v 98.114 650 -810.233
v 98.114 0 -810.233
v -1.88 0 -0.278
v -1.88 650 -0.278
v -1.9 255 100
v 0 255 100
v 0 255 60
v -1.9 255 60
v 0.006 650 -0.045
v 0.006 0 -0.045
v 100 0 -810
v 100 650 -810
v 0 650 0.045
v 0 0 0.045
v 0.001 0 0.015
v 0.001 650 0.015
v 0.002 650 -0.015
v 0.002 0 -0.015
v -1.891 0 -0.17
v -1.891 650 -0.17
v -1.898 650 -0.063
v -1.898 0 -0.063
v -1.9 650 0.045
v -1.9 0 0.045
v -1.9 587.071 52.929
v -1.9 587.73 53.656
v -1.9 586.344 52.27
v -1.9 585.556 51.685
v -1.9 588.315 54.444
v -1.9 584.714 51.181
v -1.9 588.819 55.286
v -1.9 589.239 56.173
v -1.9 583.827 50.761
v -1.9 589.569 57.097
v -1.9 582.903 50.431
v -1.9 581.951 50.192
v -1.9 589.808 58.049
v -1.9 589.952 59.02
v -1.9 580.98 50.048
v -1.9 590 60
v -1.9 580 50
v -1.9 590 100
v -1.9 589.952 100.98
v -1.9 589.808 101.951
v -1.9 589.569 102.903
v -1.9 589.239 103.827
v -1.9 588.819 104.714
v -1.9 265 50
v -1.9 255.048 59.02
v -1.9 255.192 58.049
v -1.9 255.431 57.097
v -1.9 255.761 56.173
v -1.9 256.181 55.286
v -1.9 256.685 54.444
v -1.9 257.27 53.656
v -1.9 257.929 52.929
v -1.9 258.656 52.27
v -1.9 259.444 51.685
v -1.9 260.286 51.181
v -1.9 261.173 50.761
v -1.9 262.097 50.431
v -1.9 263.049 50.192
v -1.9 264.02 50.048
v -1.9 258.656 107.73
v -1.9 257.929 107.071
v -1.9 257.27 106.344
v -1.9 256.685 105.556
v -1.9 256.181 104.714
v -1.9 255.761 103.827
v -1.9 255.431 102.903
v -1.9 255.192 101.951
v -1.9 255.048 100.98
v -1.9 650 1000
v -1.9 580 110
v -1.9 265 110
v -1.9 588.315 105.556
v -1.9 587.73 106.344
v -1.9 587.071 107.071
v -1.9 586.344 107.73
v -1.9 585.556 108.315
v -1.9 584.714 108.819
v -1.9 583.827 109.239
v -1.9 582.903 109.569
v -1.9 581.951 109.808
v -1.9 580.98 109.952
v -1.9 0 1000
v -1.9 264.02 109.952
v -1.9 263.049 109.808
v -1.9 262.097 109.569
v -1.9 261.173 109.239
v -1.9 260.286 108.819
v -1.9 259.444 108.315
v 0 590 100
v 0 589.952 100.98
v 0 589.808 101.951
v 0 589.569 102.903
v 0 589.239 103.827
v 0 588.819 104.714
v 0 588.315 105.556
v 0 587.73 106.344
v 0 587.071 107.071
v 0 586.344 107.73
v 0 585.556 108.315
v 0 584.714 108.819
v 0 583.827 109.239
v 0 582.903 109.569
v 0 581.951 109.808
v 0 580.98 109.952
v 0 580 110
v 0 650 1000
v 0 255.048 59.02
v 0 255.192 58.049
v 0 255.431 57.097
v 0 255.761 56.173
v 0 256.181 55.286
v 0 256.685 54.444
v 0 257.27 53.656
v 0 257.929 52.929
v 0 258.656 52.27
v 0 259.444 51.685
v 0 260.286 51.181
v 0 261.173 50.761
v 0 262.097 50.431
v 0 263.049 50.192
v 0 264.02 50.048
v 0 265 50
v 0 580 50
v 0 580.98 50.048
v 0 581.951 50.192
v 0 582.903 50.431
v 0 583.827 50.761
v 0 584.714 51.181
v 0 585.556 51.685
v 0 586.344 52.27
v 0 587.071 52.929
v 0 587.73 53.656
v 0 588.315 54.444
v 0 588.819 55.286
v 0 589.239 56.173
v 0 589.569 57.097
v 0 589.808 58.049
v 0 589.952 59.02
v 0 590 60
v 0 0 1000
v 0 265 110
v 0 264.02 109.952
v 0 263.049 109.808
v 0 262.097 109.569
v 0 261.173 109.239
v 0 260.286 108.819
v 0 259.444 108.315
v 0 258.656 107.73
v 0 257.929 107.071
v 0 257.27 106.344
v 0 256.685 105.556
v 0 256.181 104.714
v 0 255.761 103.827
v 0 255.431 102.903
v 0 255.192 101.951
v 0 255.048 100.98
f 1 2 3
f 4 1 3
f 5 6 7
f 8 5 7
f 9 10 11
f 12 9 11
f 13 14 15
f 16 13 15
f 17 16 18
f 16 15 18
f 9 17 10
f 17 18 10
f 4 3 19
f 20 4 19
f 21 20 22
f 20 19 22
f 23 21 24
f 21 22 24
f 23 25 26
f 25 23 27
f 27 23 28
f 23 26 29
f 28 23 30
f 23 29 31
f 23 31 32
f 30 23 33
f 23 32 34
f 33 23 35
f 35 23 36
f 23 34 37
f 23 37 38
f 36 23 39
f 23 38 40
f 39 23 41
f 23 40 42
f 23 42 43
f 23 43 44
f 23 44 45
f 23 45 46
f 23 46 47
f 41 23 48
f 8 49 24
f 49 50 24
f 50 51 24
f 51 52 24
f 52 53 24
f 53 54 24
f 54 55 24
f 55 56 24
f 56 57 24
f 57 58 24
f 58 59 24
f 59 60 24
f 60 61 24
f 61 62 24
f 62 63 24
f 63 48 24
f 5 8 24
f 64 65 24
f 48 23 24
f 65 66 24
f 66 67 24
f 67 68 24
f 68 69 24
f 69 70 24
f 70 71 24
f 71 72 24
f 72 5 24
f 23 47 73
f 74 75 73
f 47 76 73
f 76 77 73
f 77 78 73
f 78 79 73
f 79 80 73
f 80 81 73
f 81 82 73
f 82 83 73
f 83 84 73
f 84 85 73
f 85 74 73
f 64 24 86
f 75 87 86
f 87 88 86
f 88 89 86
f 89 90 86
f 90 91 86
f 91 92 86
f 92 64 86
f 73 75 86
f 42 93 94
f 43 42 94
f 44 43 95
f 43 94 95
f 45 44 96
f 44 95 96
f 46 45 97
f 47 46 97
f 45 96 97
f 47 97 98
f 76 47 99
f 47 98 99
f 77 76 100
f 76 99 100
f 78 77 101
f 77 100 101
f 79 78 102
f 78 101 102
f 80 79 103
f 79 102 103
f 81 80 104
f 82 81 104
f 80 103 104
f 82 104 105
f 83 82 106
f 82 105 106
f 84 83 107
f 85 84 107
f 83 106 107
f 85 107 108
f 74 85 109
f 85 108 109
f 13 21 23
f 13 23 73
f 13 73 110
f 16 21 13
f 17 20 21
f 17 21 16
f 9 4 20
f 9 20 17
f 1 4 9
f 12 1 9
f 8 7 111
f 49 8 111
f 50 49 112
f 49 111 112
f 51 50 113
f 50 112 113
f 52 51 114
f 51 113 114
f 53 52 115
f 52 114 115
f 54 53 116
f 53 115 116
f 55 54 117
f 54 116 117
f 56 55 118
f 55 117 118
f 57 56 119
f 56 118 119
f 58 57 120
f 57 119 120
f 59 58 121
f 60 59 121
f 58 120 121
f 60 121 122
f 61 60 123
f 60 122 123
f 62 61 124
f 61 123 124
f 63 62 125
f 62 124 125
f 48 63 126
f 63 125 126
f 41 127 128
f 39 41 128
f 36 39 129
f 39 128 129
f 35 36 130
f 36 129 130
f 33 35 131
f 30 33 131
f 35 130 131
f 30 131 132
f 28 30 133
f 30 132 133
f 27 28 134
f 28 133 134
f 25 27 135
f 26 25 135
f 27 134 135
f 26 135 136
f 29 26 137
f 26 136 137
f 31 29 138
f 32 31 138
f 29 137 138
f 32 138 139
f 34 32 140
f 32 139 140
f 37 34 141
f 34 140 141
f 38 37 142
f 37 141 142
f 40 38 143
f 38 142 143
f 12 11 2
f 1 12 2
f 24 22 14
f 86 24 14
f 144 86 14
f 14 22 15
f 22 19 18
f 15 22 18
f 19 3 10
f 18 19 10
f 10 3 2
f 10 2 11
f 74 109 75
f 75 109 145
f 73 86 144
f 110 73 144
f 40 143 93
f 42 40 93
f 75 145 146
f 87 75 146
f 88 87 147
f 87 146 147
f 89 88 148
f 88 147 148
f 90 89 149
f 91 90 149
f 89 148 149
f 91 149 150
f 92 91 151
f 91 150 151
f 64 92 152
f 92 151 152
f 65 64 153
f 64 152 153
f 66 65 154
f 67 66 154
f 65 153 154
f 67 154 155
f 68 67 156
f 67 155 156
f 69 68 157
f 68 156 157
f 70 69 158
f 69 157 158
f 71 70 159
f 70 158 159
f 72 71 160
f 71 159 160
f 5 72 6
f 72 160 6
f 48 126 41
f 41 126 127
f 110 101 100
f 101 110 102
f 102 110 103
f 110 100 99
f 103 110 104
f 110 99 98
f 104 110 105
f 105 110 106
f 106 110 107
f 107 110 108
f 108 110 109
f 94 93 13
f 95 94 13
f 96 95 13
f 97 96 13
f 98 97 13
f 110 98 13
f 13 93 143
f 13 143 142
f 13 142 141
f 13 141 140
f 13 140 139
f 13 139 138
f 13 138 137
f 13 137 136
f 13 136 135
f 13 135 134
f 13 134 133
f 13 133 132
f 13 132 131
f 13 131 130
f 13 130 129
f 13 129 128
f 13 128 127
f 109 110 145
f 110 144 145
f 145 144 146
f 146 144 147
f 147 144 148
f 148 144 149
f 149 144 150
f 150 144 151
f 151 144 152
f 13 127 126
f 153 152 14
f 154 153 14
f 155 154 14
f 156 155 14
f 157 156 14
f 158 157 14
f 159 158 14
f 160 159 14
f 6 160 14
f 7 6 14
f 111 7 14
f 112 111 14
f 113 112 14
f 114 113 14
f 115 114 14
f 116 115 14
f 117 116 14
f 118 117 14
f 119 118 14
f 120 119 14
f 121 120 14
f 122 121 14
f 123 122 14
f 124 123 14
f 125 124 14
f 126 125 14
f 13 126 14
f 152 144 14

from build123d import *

# Parameters (mm, degrees)
BRIDA_BASE2_DEPTH          = 650
CORTAR_EXTRUIR1_DEPTH      = 1198.031165008
CORTAR_EXTRUIR1_DEPTH_BACK = 1198.031165008


# Sheet-metal steps are written as plain solids
with BuildPart() as part:
    # Croquis1 → Brida base2 (new body)
    with BuildSketch(Plane(origin=(0, 0, 0), x_dir=(1, 0, 0), z_dir=(0, 1, 0))):
        with BuildLine():
            Line((0, -1000), (0, -0.045297188))
            ThreePointArc((0, -0.045297188), (0.001388837, -8.5406e-05), (0.005550109, 0.044955885))
            Line((0.005550109, 0.044955885), (100, 810))
            Line((100, 810), (98.114316057, 810.232800487))
            Line((98.114316057, 810.232800487), (-1.880133834, 0.277756371))
            ThreePointArc((-1.880133834, 0.277756371), (-1.895028772, 0.116534721), (-1.9, -0.045297188))
            Line((-1.9, -0.045297188), (-1.9, -1000))
            Line((-1.9, -1000), (0, -1000))
        make_face()
    extrude(amount=BRIDA_BASE2_DEPTH)

    # Croquis11 → Cortar-Extruir1 (cut, two sides: drawn at the far end of the back side and taken through both)
    with BuildSketch(Plane.ZY.offset(1.9).offset(-CORTAR_EXTRUIR1_DEPTH_BACK)):
        with BuildLine():
            Line((60, 590), (100, 590))
            ThreePointArc((100, 590), (107.071067812, 587.071067812), (110, 580))
            Line((110, 580), (110, 265))
            ThreePointArc((110, 265), (107.071067812, 257.928932188), (100, 255))
            Line((100, 255), (60, 255))
            ThreePointArc((60, 255), (52.928932188, 257.928932188), (50, 265))
            Line((50, 265), (50, 580))
            ThreePointArc((50, 580), (52.928932188, 587.071067812), (60, 590))
        make_face()
    extrude(amount=CORTAR_EXTRUIR1_DEPTH + CORTAR_EXTRUIR1_DEPTH_BACK, mode=Mode.SUBTRACT)


solid = part.part
